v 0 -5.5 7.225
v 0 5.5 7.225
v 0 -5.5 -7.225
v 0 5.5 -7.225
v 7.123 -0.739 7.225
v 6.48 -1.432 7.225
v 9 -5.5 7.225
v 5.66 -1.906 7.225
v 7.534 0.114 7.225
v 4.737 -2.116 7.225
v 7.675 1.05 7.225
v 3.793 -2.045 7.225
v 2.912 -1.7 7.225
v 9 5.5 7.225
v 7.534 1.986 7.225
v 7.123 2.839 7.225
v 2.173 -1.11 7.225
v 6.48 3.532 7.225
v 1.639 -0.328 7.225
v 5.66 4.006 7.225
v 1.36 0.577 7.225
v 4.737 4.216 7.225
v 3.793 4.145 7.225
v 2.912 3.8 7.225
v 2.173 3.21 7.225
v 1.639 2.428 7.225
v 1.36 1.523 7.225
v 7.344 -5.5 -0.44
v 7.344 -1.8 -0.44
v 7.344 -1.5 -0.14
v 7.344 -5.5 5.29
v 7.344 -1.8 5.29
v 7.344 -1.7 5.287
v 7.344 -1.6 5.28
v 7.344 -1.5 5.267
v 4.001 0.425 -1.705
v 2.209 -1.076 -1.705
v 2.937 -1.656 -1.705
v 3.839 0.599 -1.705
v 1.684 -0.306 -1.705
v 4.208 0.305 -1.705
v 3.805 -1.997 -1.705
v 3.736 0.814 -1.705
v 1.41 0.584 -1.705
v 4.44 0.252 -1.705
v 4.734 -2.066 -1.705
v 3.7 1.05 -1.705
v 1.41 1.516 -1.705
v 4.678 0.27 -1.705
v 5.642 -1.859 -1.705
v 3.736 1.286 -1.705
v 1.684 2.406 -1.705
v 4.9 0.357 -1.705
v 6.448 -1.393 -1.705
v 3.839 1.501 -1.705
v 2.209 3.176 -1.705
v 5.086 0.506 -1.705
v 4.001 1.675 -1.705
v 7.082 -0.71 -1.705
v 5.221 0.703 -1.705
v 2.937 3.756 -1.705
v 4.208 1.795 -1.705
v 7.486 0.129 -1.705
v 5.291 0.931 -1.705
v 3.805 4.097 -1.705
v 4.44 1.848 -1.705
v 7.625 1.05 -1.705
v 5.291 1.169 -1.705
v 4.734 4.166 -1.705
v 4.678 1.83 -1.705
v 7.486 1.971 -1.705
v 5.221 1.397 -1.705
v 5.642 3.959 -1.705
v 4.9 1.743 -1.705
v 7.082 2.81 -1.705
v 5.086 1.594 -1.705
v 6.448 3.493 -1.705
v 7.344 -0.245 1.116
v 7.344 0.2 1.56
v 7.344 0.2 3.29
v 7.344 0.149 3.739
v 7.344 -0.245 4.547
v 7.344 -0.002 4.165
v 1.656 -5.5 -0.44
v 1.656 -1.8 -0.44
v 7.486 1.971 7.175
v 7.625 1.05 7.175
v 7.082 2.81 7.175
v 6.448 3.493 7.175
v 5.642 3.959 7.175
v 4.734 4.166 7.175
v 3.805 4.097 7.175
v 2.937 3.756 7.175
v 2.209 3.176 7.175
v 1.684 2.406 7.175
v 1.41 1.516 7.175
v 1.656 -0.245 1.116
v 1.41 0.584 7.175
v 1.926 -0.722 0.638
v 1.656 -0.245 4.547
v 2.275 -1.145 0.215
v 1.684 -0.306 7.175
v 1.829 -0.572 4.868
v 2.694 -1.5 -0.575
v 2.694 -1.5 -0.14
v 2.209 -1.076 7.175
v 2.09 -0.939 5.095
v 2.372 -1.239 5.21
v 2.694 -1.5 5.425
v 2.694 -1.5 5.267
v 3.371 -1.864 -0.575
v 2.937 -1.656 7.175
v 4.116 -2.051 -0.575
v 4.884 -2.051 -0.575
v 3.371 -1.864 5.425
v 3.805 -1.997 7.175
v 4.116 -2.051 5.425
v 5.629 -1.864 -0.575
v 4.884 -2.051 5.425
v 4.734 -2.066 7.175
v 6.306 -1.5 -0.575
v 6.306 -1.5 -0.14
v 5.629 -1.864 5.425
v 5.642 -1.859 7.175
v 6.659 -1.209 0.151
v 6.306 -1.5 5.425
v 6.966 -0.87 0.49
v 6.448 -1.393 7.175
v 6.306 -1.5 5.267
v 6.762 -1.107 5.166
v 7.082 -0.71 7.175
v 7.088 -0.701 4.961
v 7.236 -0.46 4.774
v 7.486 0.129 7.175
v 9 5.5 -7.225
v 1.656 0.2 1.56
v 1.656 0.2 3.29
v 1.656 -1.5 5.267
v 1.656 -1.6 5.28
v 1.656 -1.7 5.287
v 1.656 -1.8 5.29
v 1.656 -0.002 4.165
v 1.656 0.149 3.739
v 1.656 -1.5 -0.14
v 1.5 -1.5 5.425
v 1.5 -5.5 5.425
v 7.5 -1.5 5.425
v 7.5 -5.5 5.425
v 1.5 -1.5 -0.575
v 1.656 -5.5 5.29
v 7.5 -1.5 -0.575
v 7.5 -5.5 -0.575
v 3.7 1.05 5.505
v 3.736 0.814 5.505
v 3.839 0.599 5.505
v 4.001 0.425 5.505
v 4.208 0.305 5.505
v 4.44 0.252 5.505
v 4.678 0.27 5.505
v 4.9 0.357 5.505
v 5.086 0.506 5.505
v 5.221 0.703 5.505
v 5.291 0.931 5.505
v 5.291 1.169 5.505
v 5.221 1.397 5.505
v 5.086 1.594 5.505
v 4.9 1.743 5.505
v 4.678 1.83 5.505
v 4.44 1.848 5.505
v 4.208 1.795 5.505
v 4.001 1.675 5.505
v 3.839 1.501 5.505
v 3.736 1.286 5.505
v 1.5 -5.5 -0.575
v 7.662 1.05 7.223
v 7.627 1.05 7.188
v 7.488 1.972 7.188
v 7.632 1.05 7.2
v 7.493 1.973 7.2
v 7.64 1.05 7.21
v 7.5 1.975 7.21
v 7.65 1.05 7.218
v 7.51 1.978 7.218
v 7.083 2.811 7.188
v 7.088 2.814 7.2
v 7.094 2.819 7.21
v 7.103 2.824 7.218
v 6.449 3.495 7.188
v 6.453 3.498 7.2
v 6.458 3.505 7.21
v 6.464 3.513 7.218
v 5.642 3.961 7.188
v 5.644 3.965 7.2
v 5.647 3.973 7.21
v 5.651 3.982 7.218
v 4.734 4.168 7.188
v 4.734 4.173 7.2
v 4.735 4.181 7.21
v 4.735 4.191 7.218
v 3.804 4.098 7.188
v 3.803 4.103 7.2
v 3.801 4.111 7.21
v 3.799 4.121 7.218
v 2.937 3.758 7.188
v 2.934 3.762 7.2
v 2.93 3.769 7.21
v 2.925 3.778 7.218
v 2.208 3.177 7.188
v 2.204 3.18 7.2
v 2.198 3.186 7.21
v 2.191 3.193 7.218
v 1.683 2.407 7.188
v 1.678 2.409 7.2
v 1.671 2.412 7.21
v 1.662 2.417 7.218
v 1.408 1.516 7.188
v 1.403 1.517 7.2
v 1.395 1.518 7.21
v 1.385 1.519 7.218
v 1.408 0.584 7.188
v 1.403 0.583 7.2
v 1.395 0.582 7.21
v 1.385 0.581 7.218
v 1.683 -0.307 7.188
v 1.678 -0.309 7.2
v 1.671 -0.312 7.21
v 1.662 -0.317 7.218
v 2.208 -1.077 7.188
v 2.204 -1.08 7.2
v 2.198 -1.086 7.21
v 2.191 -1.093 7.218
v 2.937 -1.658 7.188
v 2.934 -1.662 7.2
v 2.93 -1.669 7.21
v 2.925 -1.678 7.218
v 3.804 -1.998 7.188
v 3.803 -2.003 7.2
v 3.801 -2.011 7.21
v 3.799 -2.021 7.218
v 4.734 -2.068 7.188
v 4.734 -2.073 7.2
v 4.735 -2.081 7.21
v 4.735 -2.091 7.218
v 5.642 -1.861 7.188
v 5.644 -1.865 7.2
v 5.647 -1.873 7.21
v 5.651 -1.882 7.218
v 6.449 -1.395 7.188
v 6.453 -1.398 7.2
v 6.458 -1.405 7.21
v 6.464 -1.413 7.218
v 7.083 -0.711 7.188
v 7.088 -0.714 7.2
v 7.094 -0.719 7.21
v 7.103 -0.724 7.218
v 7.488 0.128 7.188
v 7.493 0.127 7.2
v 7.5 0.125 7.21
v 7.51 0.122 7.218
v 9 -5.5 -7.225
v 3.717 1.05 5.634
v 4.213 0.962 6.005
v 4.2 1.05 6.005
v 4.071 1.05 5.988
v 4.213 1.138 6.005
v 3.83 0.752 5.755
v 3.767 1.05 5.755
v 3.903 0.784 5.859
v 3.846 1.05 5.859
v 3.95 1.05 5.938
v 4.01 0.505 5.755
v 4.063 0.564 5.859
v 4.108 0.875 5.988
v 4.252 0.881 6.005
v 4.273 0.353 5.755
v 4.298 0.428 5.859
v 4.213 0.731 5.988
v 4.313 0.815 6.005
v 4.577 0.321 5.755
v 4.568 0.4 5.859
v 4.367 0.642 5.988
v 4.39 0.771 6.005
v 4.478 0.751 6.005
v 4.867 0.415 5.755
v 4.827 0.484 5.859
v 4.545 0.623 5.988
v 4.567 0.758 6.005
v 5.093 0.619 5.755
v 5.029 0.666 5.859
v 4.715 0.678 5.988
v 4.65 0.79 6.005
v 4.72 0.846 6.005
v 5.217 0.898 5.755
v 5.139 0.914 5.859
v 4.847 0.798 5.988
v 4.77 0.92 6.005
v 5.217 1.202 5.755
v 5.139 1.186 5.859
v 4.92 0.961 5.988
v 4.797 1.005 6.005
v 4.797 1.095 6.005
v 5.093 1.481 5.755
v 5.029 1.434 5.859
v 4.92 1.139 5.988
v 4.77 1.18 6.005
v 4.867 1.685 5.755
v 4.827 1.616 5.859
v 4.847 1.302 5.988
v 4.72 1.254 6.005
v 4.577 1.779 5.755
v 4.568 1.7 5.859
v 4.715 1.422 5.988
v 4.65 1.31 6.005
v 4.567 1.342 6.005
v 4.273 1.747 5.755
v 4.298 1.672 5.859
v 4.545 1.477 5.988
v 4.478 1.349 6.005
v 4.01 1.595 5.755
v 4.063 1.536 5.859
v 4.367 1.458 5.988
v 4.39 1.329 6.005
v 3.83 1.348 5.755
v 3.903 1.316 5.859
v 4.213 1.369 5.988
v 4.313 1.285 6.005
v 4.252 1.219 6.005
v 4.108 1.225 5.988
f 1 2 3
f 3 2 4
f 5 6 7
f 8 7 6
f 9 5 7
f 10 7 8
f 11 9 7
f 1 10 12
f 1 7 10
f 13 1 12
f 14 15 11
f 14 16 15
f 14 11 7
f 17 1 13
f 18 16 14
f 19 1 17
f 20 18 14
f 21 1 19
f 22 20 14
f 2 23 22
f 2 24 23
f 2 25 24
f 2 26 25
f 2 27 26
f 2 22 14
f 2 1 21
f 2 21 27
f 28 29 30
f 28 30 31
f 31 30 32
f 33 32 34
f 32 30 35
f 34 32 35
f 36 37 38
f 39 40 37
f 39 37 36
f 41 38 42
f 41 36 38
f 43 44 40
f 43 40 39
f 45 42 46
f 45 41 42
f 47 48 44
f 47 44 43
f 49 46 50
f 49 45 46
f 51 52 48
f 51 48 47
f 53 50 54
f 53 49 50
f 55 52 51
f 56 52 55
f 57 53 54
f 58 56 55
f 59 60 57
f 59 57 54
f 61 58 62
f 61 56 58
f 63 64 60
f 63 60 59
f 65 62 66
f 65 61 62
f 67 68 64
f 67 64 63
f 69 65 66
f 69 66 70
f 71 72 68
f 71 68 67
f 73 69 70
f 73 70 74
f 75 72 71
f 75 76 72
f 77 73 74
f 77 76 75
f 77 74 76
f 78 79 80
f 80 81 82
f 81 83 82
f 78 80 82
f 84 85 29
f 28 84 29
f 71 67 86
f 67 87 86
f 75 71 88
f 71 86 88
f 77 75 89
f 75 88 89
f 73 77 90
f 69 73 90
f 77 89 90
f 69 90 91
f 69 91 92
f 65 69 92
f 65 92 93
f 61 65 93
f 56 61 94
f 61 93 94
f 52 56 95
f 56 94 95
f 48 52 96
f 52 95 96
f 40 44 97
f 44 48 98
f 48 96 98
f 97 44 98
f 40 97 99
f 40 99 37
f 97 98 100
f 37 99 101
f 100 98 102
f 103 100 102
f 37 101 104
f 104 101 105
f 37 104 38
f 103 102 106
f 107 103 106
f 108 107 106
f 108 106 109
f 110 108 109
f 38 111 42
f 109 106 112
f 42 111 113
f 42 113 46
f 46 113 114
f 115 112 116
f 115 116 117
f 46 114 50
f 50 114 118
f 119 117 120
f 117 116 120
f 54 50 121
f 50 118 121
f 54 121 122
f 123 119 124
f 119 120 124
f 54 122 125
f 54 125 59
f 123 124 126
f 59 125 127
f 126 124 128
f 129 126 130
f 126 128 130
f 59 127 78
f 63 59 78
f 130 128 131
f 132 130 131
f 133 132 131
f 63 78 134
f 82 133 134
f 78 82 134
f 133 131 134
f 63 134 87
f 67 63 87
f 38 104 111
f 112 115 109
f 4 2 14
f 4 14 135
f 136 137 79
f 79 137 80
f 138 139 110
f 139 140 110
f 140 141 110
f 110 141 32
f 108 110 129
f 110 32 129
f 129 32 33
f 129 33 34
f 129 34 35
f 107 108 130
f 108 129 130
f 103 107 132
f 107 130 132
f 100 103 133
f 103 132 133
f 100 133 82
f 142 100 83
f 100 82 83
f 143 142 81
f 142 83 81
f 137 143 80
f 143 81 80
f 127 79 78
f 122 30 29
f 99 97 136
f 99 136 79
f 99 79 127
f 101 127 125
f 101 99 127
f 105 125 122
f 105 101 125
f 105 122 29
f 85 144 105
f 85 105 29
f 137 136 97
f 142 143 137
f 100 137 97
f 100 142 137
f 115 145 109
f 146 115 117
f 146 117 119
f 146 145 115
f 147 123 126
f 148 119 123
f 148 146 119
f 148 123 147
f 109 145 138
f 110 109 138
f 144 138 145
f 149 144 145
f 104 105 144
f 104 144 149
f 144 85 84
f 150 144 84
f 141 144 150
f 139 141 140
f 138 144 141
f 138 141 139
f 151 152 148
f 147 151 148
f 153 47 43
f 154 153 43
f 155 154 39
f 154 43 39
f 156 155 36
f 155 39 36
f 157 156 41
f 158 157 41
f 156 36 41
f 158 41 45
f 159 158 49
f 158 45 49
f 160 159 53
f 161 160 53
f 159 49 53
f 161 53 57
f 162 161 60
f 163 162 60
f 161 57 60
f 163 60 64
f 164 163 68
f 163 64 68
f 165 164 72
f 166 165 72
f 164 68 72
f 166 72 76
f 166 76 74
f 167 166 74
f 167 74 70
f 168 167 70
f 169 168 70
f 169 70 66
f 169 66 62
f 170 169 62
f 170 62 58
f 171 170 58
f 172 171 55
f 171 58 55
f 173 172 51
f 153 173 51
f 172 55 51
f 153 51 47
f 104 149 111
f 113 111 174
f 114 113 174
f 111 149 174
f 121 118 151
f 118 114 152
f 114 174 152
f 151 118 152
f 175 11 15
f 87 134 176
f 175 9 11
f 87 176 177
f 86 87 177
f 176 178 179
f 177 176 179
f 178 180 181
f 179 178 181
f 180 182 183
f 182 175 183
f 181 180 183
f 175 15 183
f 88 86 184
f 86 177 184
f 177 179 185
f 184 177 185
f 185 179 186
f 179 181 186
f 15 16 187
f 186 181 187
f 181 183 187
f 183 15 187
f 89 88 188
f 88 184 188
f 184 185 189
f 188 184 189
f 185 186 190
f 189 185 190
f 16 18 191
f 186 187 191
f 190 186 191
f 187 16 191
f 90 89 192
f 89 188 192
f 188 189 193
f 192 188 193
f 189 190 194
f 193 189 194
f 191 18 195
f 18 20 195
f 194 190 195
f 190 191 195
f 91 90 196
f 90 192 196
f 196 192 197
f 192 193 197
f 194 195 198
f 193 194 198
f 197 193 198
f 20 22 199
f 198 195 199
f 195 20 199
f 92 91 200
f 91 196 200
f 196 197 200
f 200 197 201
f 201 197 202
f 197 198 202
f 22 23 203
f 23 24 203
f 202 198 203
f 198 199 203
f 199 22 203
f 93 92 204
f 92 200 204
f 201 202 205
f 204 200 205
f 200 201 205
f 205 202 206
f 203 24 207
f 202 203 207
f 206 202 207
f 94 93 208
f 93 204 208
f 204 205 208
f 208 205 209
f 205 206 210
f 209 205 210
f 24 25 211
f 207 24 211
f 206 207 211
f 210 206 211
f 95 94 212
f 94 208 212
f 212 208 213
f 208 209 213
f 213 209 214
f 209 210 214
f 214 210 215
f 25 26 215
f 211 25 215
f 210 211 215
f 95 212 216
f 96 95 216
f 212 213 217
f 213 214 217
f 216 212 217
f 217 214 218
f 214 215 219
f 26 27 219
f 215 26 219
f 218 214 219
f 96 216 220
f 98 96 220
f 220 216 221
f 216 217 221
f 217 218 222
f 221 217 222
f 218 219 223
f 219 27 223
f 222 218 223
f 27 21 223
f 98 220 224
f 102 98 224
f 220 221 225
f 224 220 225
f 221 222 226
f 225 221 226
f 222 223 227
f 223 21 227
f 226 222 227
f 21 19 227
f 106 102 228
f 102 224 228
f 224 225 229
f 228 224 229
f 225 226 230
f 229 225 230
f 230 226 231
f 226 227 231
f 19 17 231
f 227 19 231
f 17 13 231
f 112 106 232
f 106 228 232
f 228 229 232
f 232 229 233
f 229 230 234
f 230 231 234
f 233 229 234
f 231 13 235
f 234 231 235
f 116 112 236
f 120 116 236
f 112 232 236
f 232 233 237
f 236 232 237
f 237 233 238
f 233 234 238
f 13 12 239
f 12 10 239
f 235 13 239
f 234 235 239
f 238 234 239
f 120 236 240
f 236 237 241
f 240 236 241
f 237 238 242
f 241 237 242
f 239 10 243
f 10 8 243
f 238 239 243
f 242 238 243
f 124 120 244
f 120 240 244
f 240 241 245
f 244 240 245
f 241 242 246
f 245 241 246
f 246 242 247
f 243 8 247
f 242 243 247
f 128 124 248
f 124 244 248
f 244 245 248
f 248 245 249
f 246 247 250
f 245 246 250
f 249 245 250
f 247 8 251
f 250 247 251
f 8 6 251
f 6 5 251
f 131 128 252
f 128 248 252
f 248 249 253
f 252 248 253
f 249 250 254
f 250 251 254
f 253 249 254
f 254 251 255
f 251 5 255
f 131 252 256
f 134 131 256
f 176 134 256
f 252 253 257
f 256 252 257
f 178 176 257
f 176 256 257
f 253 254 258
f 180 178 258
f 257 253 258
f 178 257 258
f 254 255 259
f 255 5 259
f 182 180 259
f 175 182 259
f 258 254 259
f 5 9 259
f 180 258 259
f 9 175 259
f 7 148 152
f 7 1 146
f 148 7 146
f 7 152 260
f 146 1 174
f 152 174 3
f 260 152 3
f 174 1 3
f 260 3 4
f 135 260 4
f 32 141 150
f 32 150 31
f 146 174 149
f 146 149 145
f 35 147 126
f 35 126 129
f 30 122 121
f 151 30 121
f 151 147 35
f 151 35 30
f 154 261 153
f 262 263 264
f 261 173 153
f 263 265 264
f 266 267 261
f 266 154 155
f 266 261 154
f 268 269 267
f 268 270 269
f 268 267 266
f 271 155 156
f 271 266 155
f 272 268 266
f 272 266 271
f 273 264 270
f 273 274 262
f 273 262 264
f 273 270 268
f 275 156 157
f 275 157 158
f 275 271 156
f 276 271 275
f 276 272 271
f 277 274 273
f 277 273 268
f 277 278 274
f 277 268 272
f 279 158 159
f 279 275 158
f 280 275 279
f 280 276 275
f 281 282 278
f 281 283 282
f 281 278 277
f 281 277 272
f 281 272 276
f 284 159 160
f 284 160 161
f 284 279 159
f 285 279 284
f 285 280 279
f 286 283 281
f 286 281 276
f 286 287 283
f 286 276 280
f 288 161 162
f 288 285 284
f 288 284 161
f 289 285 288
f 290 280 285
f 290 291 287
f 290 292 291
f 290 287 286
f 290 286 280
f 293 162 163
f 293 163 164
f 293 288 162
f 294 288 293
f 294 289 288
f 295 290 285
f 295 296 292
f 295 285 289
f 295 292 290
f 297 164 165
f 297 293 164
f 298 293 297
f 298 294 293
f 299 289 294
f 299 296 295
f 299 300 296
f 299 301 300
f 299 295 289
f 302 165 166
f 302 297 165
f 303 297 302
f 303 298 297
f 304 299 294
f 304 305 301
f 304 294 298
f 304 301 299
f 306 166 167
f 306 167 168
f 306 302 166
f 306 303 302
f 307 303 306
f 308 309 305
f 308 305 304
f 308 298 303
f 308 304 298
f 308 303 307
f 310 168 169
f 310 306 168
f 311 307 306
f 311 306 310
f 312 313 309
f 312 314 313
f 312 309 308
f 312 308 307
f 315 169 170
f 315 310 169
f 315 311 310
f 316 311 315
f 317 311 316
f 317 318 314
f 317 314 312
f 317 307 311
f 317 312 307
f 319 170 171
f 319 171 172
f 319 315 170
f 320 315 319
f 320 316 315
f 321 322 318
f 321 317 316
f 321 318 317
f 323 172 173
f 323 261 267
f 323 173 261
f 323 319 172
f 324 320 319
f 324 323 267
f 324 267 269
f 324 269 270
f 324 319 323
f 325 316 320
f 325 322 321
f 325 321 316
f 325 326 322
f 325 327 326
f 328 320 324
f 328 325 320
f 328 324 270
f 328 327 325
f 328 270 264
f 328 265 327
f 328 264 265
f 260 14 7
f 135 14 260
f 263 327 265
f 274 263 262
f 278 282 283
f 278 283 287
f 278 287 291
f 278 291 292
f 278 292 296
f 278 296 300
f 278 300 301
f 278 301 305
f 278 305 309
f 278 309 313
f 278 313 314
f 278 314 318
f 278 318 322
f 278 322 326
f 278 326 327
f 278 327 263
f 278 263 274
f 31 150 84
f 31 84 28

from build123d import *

# Parameters (mm, degrees)
ESBO_O1_W                     = 14.45
ESBO_O1_H                     = 11
RESSALTO_EXTRUS_O1_DEPTH      = 9
ESBO_O3_R                     = 3.125
CORTE_EXTRUS_O2_DEPTH         = 8.93
ESBO_O4_R                     = 0.8
RESSALTO_EXTRUS_O2_DEPTH      = 7.71
FILETE1_R                     = 0.5
FILETE2_R                     = 0.05
ESBO_O5_W                     = 6
ESBO_O5_H                     = 6
CORTE_EXTRUS_O5_DEPTH         = 4
RESSALTO_EXTRUS_O4_DEPTH      = 4
RESSALTO_EXTRUS_O4_DEPTH_BACK = 1.7
ESBO_O7_W                     = 5.688524138
ESBO_O7_H                     = 5.729720352
FILETE5_R                     = 2
CHANFRO4_SIZE                 = 2


with BuildPart() as part:
    # Esboço1 → Ressalto-extrusão1 (new body)
    with BuildSketch(Plane(origin=(0, 0, 0), x_dir=(0, 0, -1), z_dir=(1, 0, 0))):
        Rectangle(ESBO_O1_W, ESBO_O1_H)
    extrude(amount=RESSALTO_EXTRUS_O1_DEPTH)

    # Esboço3 → Corte-extrusão2 (cut)
    with BuildSketch(Plane.XY.offset(7.225)):
        with Locations((4.5, 1.05)):
            Circle(ESBO_O3_R)
    extrude(amount=-CORTE_EXTRUS_O2_DEPTH, mode=Mode.SUBTRACT)

    # Esboço4 → Ressalto-extrusão2 (add)
    with BuildSketch(Plane.XY.offset(-1.705)):
        with Locations(Location((4.5, 1.05, 0), (0, 0, 180))):
            Circle(ESBO_O4_R)
    extrude(amount=RESSALTO_EXTRUS_O2_DEPTH)

    # Filete1
    filete1_edges = [part.edges().sort_by_distance(p)[0] for p in [
        (5.3, 1.05, 6.005),
    ]]
    fillet(filete1_edges, radius=FILETE1_R)

    # Filete2
    filete2_edges = [part.edges().sort_by_distance(p)[0] for p in [
        (1.375, 1.05, 7.225),
    ]]
    fillet(filete2_edges, radius=FILETE2_R)

    # Esboço5 → Corte-extrusão5 (cut)
    with BuildSketch(Plane.XZ.offset(5.5)):
        with Locations((4.5, 2.425)):
            Rectangle(ESBO_O5_W, ESBO_O5_H)
    extrude(amount=-CORTE_EXTRUS_O5_DEPTH, mode=Mode.SUBTRACT)

    # Esboço7 → Ressalto-extrusão4 (add, two sides: drawn at the far end of the back side and taken through both)
    with BuildSketch(Plane.XZ.offset(1.5).offset(-RESSALTO_EXTRUS_O4_DEPTH_BACK)):
        with Locations((4.5, 2.425)):
            Rectangle(ESBO_O7_W, ESBO_O7_H)
    extrude(amount=RESSALTO_EXTRUS_O4_DEPTH + RESSALTO_EXTRUS_O4_DEPTH_BACK)

    # Filete5
    # the kernel refuses this fillet: 2 mm, written as the material it takes off along each edge
    with BuildSketch(Plane(origin=(12.344262069, 0.2, 5.289860176), x_dir=(0, -1, 0), z_dir=(-1, 0, 0))) as filete5_piece_1_section:
        with BuildLine():
            CenterArc((FILETE5_R, -FILETE5_R), FILETE5_R, 90, 90)
            Line((0, -FILETE5_R), (0, 0))
            Line((0, 0), (FILETE5_R, 0))
        make_face()
    filete5_piece_1 = extrude(amount=15.688524139, mode=Mode.PRIVATE)
    filete5_piece_1 = split(filete5_piece_1, bisect_by=Plane(origin=(6.764399642, -1.5, 5.283313475), z_dir=(0, -1, 0)), keep=Keep.TOP, mode=Mode.PRIVATE)
    filete5_piece_1 = split(filete5_piece_1, bisect_by=Plane(origin=(1.5, -1.579624939, 5.283313475), z_dir=(1, 0, 0)), keep=Keep.TOP, mode=Mode.PRIVATE)
    filete5_piece_1 = split(filete5_piece_1, bisect_by=Plane(origin=(7.5, -1.579624939, 5.283313475), z_dir=(-1, 0, 0)), keep=Keep.TOP, mode=Mode.PRIVATE)
    add(filete5_piece_1, mode=Mode.SUBTRACT)
    with BuildSketch(Plane(origin=(12.344262069, 0.2, 5.289860176), x_dir=(0, -1, 0), z_dir=(-1, 0, 0))) as filete5_piece_2_section:
        with BuildLine():
            CenterArc((FILETE5_R, -FILETE5_R), FILETE5_R, 90, 90)
            Line((0, -FILETE5_R), (0, 0))
            Line((0, 0), (FILETE5_R, 0))
        make_face()
    filete5_piece_2 = extrude(amount=15.688524139, mode=Mode.PRIVATE)
    filete5_piece_2 = filete5_piece_2 & Plane(origin=(4.5, 1.05, 4.831537274), x_dir=(1, 0, 0), z_dir=(0, 0, 1)) * Cylinder(3.125, 40, mode=Mode.PRIVATE)
    add(filete5_piece_2, mode=Mode.SUBTRACT)

    # Chanfro4
    # the kernel refuses this chamfer: 2 mm, written as the material it takes off along each edge
    with BuildSketch(Plane(origin=(-3.487628045, 0.2, -0.439860176), x_dir=(0, 0.02749587661058638, 0.9996219169112968), z_dir=(1, 0, 0))) as chanfro4_piece_1_section:
        Polygon((CHANFRO4_SIZE * 0.999621916911, CHANFRO4_SIZE * 0.0274958766106), (-CHANFRO4_SIZE * 0.0274958766106, CHANFRO4_SIZE * 0.999621916911), (0, 0), align=None)
    chanfro4_piece_1 = extrude(amount=15.975256091, mode=Mode.PRIVATE)
    chanfro4_piece_1 = split(chanfro4_piece_1, bisect_by=Plane(origin=(2.25835967, -1.5, -0.343331673), z_dir=(0, -1, 0)), keep=Keep.TOP, mode=Mode.PRIVATE)
    chanfro4_piece_1 = split(chanfro4_piece_1, bisect_by=Plane(origin=(7.5, -1.606942994, -0.343331673), z_dir=(-1, 0, 0)), keep=Keep.TOP, mode=Mode.PRIVATE)
    chanfro4_piece_1 = split(chanfro4_piece_1, bisect_by=Plane(origin=(1.5, -1.606942994, -0.343331673), z_dir=(1, 0, 0)), keep=Keep.TOP, mode=Mode.PRIVATE)
    add(chanfro4_piece_1, mode=Mode.SUBTRACT)
    with BuildSketch(Plane(origin=(-3.487628045, 0.2, -0.439860176), x_dir=(0, 0.02749587661058638, 0.9996219169112968), z_dir=(1, 0, 0))) as chanfro4_piece_2_section:
        Polygon((CHANFRO4_SIZE * 0.999621916911, CHANFRO4_SIZE * 0.0274958766106), (-CHANFRO4_SIZE * 0.0274958766106, CHANFRO4_SIZE * 0.999621916911), (0, 0), align=None)
    chanfro4_piece_2 = extrude(amount=15.975256091, mode=Mode.PRIVATE)
    chanfro4_piece_2 = chanfro4_piece_2 & Plane(origin=(4.5, 1.05, 0.259438948), x_dir=(1, 0, 0), z_dir=(0, 0, 1)) * Cylinder(3.125, 40, mode=Mode.PRIVATE)
    add(chanfro4_piece_2, mode=Mode.SUBTRACT)


solid = part.part
